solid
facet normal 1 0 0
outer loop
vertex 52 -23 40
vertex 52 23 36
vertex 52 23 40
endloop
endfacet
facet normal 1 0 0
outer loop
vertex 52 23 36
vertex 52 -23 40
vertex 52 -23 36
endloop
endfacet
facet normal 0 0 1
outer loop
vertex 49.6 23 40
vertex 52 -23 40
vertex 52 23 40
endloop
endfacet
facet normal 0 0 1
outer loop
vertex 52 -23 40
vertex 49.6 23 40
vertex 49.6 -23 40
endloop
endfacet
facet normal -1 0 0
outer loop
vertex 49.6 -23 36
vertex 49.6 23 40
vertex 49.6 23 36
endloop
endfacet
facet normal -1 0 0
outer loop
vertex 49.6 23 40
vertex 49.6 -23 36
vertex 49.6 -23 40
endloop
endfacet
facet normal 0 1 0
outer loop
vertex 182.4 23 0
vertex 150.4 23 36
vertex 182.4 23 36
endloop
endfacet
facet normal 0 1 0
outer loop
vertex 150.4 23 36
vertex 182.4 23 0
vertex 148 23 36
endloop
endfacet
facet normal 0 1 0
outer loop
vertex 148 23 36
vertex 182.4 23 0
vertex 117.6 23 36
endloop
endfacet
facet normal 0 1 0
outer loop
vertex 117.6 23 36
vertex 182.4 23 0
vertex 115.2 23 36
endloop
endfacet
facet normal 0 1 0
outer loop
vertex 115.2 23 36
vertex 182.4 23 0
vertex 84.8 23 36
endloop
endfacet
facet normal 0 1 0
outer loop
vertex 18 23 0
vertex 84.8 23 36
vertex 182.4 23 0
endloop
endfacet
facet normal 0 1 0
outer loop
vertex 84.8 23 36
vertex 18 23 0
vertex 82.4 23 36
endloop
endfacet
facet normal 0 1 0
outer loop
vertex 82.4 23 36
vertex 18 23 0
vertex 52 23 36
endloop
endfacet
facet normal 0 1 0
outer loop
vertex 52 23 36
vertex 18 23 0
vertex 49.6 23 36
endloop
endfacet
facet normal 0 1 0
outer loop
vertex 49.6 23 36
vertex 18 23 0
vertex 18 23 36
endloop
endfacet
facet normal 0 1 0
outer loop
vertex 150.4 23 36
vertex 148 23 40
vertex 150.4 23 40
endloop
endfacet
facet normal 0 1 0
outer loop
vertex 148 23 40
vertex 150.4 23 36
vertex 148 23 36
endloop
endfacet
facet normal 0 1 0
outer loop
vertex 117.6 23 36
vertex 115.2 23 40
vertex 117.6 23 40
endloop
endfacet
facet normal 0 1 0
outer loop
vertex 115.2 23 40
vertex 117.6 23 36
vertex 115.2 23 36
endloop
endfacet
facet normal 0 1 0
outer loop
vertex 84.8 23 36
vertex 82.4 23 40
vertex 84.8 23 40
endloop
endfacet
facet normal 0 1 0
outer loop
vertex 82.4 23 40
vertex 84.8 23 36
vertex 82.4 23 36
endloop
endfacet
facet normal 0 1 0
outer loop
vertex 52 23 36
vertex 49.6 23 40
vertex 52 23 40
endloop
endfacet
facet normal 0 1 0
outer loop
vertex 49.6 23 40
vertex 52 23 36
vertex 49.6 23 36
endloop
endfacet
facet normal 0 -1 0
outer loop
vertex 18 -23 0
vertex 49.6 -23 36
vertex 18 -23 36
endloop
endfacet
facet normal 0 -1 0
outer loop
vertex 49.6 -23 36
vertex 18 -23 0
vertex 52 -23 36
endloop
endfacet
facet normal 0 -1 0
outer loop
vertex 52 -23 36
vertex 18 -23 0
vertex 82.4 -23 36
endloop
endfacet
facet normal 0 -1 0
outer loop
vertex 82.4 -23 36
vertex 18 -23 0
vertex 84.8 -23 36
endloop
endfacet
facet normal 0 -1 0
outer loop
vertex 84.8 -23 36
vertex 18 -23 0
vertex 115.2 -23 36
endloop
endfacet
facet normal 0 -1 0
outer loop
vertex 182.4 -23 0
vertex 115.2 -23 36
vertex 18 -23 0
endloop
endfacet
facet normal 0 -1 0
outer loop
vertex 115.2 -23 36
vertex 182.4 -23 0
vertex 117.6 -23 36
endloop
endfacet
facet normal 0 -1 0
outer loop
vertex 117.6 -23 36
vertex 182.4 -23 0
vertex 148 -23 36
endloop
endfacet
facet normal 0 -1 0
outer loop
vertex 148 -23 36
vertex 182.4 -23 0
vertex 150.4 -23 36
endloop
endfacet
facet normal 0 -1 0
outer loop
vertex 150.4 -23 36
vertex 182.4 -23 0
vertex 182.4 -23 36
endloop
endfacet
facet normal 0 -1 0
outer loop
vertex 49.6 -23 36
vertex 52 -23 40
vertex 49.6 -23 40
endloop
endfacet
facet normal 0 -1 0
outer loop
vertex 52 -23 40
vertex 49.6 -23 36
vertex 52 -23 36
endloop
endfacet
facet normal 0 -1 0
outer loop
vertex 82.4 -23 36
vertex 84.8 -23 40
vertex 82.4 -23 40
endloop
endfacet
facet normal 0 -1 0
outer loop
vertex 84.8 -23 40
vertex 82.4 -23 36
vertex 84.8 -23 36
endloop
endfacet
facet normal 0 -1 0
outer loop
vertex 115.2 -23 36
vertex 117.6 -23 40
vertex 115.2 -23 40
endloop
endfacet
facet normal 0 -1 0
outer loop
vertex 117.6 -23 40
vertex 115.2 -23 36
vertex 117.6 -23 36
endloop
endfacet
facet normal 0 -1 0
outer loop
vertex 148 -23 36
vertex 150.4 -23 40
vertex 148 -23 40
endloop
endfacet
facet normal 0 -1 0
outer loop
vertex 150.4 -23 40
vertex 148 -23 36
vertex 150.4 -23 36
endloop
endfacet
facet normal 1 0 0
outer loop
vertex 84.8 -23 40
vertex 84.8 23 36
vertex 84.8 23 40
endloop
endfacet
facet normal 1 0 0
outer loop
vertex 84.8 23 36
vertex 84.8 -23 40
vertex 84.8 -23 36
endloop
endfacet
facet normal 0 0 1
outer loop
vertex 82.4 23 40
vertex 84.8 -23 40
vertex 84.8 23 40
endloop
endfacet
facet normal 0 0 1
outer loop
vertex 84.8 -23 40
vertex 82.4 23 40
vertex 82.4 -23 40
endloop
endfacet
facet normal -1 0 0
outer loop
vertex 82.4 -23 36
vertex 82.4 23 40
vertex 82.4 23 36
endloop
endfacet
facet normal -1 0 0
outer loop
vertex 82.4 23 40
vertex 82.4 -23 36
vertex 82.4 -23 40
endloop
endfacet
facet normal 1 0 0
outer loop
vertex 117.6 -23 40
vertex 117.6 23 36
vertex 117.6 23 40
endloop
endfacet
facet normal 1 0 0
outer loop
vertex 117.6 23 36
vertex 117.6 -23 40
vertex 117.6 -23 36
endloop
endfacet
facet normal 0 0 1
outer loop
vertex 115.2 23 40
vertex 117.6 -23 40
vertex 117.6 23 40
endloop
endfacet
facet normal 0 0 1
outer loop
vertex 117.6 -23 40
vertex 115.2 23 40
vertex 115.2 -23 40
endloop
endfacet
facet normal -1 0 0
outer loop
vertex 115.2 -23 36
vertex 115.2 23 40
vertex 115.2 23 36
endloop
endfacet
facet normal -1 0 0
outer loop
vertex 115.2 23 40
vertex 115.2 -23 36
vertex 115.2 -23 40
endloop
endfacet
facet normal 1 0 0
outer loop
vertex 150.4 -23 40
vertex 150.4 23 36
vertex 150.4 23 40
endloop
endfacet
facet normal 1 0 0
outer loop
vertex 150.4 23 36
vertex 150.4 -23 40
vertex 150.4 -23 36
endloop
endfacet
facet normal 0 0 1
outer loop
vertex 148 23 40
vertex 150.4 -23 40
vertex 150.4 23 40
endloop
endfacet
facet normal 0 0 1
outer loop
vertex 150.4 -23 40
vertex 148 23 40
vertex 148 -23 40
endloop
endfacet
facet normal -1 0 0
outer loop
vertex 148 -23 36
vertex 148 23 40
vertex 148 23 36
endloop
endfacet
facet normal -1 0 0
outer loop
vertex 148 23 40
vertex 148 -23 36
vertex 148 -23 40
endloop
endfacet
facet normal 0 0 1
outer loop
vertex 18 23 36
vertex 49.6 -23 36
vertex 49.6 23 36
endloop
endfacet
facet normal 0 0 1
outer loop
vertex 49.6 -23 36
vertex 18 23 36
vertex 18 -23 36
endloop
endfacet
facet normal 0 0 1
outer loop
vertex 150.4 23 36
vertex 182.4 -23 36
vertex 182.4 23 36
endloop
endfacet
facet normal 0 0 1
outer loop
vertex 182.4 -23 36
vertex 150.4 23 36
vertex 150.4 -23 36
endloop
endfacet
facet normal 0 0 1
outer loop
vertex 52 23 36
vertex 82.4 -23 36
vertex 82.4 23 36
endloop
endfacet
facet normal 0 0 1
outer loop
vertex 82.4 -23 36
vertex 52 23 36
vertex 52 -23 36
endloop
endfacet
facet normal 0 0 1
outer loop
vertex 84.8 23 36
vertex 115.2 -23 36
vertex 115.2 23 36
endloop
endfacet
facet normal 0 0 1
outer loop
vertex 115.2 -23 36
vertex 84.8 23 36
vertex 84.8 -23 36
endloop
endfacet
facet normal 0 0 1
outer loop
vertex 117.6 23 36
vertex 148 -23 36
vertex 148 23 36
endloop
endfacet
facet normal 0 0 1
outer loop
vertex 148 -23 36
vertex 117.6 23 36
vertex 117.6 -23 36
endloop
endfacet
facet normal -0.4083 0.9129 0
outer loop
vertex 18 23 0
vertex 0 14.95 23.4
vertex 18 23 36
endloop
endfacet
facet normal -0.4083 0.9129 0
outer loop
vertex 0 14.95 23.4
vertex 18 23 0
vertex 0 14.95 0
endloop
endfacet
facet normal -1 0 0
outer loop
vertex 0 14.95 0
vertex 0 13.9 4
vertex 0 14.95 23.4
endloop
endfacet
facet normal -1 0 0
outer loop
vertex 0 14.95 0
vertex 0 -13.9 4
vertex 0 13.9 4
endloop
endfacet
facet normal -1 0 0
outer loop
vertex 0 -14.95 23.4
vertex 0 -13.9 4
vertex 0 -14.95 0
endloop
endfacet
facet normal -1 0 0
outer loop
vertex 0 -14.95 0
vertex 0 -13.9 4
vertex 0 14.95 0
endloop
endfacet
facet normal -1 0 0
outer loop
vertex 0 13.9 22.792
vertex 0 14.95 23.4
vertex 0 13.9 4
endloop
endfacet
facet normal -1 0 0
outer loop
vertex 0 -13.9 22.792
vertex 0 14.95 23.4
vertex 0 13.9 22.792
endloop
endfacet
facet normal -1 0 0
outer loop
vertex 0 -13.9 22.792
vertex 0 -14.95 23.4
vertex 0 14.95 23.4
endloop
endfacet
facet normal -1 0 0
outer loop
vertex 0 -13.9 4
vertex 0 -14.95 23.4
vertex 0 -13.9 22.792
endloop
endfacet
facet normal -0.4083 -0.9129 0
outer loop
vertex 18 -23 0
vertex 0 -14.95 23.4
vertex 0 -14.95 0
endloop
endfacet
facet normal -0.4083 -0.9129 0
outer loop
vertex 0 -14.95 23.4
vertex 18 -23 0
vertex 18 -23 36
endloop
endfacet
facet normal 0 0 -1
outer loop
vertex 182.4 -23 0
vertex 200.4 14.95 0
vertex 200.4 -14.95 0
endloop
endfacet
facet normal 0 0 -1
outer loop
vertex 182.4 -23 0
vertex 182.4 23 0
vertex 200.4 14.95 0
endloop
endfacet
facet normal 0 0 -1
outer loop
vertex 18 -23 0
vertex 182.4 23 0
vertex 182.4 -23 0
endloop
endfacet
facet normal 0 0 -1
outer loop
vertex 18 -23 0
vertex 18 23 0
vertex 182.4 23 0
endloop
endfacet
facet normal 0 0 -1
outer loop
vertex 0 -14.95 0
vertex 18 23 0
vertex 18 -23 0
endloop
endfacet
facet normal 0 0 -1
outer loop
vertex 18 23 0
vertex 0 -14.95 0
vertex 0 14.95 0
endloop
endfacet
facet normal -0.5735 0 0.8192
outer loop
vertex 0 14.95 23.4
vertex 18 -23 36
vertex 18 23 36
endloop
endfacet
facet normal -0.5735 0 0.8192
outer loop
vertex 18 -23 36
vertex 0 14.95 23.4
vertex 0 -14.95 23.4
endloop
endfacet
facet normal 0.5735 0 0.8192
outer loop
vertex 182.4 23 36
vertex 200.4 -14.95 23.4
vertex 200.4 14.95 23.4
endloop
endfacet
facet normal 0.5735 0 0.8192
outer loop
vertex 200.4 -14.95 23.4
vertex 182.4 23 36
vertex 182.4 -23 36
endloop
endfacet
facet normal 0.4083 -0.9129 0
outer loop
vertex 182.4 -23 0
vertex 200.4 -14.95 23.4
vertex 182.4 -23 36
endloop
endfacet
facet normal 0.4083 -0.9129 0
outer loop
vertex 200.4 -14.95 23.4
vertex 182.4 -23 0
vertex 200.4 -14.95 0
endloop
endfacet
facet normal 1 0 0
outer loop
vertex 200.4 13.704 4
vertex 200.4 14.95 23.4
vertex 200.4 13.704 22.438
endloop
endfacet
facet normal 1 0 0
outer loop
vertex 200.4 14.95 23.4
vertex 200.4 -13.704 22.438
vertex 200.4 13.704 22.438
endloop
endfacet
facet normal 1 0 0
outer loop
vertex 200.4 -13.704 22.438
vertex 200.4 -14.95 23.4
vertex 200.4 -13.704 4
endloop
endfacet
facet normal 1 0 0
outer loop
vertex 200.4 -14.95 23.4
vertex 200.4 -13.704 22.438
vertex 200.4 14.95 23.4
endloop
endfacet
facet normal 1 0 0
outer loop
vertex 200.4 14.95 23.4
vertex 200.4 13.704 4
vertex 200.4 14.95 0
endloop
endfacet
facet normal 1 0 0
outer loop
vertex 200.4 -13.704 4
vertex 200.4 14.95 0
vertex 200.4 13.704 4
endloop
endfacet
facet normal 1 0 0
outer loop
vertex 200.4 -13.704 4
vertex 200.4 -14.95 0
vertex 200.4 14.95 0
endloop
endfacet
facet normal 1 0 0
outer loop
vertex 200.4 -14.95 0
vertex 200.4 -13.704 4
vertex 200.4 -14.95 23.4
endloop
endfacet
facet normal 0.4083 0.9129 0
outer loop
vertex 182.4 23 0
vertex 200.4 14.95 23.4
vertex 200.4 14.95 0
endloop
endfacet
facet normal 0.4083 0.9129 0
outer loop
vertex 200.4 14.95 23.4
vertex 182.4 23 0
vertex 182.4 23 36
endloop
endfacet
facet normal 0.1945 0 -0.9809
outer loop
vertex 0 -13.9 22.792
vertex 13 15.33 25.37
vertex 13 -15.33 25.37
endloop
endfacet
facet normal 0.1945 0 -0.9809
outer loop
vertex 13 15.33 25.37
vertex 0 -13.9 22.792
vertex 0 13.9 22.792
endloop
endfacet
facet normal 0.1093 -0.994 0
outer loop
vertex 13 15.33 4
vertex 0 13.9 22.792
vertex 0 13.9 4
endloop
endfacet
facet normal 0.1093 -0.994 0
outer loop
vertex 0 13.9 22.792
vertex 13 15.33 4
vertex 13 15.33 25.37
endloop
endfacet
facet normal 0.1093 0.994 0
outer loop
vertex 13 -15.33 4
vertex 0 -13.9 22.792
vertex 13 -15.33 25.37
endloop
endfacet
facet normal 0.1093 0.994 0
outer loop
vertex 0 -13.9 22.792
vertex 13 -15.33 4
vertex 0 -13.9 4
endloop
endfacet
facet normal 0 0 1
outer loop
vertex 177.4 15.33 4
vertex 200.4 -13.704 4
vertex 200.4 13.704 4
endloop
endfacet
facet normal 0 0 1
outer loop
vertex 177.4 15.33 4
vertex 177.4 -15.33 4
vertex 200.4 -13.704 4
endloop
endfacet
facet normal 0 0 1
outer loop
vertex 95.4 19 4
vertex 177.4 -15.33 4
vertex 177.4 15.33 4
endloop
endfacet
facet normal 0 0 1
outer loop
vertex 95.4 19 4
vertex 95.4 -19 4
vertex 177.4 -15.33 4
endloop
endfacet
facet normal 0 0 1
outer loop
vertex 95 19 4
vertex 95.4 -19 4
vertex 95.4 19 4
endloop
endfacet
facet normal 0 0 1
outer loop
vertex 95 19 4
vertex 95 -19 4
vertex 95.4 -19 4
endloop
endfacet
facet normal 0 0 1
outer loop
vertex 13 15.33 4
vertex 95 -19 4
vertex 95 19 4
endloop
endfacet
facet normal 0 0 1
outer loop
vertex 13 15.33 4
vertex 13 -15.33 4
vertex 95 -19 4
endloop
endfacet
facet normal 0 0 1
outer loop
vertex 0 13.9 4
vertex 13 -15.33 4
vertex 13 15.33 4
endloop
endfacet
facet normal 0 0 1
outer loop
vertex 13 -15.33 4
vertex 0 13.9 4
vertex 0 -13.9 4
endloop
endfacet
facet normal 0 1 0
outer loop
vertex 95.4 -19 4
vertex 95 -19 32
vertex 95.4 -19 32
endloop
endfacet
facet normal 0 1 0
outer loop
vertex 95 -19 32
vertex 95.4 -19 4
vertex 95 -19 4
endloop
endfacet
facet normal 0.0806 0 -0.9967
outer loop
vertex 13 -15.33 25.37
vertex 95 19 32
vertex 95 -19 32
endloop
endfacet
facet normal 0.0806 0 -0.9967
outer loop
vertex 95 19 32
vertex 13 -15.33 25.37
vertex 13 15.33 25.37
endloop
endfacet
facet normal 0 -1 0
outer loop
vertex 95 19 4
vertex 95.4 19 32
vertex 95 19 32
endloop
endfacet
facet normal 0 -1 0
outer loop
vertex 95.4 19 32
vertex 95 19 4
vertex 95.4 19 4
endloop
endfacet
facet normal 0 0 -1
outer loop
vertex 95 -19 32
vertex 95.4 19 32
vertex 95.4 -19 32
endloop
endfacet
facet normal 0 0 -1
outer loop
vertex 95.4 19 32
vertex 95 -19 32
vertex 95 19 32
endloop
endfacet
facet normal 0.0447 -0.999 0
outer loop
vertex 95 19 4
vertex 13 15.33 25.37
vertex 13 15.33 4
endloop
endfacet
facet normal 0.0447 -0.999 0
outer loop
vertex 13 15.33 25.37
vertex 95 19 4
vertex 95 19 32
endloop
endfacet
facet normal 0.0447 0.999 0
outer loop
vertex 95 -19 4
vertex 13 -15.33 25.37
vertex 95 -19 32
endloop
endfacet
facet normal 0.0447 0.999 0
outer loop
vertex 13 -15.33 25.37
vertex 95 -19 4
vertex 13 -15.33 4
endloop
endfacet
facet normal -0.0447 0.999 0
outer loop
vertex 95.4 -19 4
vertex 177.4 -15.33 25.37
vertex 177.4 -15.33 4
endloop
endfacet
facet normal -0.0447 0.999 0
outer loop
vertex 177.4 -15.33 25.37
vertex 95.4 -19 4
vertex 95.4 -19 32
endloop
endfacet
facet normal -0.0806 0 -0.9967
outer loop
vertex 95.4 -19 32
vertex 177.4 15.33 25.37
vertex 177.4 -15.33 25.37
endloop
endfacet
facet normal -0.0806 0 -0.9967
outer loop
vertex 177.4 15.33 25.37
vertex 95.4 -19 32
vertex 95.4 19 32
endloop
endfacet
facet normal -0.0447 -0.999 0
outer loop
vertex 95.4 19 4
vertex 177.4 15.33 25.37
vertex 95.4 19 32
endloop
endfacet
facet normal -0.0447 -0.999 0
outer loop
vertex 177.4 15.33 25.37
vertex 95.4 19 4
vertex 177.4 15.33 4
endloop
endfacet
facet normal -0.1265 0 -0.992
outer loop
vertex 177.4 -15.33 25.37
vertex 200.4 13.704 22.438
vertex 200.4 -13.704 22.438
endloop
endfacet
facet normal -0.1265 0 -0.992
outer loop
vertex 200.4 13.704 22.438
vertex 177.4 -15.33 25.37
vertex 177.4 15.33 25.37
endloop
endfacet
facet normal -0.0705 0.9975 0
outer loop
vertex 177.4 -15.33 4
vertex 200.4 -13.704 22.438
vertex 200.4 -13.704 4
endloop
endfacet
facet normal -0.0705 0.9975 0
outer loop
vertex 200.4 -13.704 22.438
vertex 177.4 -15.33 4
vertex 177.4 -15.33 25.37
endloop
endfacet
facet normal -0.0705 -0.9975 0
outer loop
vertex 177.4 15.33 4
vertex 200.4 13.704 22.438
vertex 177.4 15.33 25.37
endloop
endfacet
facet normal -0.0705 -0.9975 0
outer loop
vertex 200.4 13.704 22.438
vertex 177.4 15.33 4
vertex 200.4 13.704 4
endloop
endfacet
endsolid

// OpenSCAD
$fn = 32;

// ----------------------------------------------------------------------
// Faired channel: 200 x 46 x 36 mm, 4 mm walls, faired ends
// ----------------------------------------------------------------------

// --- parameters (mm) ---
length = 200;             // channel length
width = 46;               // channel width at mid length
height = 36;              // channel height at mid length
wall = 4;                 // side wall thickness
floor_t = 4;              // floor thickness
end_w = 29.9;             // faired end width
end_h = 23.4;             // faired end height
ribs = 4;                 // stiffening ribs on the top
rib_t = 2.4;              // rib thickness
rib_h = 4;                // rib height

difference() {
  union() {
    hull() {
      translate([0, -14.95, 0]) cube([0.4, 29.9, 23.4]);
      translate([18, -23, 0]) cube([0.4, 46, 36]);
    }
    hull() {
      translate([18, -23, 0]) cube([0.4, 46, 36]);
      translate([100, -23, 0]) cube([0.4, 46, 36]);
    }
    hull() {
      translate([100, -23, 0]) cube([0.4, 46, 36]);
      translate([182, -23, 0]) cube([0.4, 46, 36]);
    }
    hull() {
      translate([182, -23, 0]) cube([0.4, 46, 36]);
      translate([200, -14.95, 0]) cube([0.4, 29.9, 23.4]);
    }
    /* stiffening ribs across the flat top, sunk 0.8 mm into it */
    for (i = [1 : ribs]) {
      translate([18 + i * (length - 2 * 18) / (ribs + 1) - rib_t / 2, -width / 2, height - 0.8]) cube([rib_t, width, rib_h + 0.8]);
    }
  }
  /* cavity, 5 mm proud of both ends so the ports are cut clean */
  hull() {
    translate([-5, -13.35, 4]) cube([0.4, 26.7, 17.8]);
    translate([13, -15.33, 4]) cube([0.4, 30.66, 21.37]);
  }
  hull() {
    translate([13, -15.33, 4]) cube([0.4, 30.66, 21.37]);
    translate([95, -19, 4]) cube([0.4, 38, 28]);
  }
  hull() {
    translate([95, -19, 4]) cube([0.4, 38, 28]);
    translate([177, -15.33, 4]) cube([0.4, 30.66, 21.37]);
  }
  hull() {
    translate([177, -15.33, 4]) cube([0.4, 30.66, 21.37]);
    translate([205, -13.35, 4]) cube([0.4, 26.7, 17.8]);
  }
}
